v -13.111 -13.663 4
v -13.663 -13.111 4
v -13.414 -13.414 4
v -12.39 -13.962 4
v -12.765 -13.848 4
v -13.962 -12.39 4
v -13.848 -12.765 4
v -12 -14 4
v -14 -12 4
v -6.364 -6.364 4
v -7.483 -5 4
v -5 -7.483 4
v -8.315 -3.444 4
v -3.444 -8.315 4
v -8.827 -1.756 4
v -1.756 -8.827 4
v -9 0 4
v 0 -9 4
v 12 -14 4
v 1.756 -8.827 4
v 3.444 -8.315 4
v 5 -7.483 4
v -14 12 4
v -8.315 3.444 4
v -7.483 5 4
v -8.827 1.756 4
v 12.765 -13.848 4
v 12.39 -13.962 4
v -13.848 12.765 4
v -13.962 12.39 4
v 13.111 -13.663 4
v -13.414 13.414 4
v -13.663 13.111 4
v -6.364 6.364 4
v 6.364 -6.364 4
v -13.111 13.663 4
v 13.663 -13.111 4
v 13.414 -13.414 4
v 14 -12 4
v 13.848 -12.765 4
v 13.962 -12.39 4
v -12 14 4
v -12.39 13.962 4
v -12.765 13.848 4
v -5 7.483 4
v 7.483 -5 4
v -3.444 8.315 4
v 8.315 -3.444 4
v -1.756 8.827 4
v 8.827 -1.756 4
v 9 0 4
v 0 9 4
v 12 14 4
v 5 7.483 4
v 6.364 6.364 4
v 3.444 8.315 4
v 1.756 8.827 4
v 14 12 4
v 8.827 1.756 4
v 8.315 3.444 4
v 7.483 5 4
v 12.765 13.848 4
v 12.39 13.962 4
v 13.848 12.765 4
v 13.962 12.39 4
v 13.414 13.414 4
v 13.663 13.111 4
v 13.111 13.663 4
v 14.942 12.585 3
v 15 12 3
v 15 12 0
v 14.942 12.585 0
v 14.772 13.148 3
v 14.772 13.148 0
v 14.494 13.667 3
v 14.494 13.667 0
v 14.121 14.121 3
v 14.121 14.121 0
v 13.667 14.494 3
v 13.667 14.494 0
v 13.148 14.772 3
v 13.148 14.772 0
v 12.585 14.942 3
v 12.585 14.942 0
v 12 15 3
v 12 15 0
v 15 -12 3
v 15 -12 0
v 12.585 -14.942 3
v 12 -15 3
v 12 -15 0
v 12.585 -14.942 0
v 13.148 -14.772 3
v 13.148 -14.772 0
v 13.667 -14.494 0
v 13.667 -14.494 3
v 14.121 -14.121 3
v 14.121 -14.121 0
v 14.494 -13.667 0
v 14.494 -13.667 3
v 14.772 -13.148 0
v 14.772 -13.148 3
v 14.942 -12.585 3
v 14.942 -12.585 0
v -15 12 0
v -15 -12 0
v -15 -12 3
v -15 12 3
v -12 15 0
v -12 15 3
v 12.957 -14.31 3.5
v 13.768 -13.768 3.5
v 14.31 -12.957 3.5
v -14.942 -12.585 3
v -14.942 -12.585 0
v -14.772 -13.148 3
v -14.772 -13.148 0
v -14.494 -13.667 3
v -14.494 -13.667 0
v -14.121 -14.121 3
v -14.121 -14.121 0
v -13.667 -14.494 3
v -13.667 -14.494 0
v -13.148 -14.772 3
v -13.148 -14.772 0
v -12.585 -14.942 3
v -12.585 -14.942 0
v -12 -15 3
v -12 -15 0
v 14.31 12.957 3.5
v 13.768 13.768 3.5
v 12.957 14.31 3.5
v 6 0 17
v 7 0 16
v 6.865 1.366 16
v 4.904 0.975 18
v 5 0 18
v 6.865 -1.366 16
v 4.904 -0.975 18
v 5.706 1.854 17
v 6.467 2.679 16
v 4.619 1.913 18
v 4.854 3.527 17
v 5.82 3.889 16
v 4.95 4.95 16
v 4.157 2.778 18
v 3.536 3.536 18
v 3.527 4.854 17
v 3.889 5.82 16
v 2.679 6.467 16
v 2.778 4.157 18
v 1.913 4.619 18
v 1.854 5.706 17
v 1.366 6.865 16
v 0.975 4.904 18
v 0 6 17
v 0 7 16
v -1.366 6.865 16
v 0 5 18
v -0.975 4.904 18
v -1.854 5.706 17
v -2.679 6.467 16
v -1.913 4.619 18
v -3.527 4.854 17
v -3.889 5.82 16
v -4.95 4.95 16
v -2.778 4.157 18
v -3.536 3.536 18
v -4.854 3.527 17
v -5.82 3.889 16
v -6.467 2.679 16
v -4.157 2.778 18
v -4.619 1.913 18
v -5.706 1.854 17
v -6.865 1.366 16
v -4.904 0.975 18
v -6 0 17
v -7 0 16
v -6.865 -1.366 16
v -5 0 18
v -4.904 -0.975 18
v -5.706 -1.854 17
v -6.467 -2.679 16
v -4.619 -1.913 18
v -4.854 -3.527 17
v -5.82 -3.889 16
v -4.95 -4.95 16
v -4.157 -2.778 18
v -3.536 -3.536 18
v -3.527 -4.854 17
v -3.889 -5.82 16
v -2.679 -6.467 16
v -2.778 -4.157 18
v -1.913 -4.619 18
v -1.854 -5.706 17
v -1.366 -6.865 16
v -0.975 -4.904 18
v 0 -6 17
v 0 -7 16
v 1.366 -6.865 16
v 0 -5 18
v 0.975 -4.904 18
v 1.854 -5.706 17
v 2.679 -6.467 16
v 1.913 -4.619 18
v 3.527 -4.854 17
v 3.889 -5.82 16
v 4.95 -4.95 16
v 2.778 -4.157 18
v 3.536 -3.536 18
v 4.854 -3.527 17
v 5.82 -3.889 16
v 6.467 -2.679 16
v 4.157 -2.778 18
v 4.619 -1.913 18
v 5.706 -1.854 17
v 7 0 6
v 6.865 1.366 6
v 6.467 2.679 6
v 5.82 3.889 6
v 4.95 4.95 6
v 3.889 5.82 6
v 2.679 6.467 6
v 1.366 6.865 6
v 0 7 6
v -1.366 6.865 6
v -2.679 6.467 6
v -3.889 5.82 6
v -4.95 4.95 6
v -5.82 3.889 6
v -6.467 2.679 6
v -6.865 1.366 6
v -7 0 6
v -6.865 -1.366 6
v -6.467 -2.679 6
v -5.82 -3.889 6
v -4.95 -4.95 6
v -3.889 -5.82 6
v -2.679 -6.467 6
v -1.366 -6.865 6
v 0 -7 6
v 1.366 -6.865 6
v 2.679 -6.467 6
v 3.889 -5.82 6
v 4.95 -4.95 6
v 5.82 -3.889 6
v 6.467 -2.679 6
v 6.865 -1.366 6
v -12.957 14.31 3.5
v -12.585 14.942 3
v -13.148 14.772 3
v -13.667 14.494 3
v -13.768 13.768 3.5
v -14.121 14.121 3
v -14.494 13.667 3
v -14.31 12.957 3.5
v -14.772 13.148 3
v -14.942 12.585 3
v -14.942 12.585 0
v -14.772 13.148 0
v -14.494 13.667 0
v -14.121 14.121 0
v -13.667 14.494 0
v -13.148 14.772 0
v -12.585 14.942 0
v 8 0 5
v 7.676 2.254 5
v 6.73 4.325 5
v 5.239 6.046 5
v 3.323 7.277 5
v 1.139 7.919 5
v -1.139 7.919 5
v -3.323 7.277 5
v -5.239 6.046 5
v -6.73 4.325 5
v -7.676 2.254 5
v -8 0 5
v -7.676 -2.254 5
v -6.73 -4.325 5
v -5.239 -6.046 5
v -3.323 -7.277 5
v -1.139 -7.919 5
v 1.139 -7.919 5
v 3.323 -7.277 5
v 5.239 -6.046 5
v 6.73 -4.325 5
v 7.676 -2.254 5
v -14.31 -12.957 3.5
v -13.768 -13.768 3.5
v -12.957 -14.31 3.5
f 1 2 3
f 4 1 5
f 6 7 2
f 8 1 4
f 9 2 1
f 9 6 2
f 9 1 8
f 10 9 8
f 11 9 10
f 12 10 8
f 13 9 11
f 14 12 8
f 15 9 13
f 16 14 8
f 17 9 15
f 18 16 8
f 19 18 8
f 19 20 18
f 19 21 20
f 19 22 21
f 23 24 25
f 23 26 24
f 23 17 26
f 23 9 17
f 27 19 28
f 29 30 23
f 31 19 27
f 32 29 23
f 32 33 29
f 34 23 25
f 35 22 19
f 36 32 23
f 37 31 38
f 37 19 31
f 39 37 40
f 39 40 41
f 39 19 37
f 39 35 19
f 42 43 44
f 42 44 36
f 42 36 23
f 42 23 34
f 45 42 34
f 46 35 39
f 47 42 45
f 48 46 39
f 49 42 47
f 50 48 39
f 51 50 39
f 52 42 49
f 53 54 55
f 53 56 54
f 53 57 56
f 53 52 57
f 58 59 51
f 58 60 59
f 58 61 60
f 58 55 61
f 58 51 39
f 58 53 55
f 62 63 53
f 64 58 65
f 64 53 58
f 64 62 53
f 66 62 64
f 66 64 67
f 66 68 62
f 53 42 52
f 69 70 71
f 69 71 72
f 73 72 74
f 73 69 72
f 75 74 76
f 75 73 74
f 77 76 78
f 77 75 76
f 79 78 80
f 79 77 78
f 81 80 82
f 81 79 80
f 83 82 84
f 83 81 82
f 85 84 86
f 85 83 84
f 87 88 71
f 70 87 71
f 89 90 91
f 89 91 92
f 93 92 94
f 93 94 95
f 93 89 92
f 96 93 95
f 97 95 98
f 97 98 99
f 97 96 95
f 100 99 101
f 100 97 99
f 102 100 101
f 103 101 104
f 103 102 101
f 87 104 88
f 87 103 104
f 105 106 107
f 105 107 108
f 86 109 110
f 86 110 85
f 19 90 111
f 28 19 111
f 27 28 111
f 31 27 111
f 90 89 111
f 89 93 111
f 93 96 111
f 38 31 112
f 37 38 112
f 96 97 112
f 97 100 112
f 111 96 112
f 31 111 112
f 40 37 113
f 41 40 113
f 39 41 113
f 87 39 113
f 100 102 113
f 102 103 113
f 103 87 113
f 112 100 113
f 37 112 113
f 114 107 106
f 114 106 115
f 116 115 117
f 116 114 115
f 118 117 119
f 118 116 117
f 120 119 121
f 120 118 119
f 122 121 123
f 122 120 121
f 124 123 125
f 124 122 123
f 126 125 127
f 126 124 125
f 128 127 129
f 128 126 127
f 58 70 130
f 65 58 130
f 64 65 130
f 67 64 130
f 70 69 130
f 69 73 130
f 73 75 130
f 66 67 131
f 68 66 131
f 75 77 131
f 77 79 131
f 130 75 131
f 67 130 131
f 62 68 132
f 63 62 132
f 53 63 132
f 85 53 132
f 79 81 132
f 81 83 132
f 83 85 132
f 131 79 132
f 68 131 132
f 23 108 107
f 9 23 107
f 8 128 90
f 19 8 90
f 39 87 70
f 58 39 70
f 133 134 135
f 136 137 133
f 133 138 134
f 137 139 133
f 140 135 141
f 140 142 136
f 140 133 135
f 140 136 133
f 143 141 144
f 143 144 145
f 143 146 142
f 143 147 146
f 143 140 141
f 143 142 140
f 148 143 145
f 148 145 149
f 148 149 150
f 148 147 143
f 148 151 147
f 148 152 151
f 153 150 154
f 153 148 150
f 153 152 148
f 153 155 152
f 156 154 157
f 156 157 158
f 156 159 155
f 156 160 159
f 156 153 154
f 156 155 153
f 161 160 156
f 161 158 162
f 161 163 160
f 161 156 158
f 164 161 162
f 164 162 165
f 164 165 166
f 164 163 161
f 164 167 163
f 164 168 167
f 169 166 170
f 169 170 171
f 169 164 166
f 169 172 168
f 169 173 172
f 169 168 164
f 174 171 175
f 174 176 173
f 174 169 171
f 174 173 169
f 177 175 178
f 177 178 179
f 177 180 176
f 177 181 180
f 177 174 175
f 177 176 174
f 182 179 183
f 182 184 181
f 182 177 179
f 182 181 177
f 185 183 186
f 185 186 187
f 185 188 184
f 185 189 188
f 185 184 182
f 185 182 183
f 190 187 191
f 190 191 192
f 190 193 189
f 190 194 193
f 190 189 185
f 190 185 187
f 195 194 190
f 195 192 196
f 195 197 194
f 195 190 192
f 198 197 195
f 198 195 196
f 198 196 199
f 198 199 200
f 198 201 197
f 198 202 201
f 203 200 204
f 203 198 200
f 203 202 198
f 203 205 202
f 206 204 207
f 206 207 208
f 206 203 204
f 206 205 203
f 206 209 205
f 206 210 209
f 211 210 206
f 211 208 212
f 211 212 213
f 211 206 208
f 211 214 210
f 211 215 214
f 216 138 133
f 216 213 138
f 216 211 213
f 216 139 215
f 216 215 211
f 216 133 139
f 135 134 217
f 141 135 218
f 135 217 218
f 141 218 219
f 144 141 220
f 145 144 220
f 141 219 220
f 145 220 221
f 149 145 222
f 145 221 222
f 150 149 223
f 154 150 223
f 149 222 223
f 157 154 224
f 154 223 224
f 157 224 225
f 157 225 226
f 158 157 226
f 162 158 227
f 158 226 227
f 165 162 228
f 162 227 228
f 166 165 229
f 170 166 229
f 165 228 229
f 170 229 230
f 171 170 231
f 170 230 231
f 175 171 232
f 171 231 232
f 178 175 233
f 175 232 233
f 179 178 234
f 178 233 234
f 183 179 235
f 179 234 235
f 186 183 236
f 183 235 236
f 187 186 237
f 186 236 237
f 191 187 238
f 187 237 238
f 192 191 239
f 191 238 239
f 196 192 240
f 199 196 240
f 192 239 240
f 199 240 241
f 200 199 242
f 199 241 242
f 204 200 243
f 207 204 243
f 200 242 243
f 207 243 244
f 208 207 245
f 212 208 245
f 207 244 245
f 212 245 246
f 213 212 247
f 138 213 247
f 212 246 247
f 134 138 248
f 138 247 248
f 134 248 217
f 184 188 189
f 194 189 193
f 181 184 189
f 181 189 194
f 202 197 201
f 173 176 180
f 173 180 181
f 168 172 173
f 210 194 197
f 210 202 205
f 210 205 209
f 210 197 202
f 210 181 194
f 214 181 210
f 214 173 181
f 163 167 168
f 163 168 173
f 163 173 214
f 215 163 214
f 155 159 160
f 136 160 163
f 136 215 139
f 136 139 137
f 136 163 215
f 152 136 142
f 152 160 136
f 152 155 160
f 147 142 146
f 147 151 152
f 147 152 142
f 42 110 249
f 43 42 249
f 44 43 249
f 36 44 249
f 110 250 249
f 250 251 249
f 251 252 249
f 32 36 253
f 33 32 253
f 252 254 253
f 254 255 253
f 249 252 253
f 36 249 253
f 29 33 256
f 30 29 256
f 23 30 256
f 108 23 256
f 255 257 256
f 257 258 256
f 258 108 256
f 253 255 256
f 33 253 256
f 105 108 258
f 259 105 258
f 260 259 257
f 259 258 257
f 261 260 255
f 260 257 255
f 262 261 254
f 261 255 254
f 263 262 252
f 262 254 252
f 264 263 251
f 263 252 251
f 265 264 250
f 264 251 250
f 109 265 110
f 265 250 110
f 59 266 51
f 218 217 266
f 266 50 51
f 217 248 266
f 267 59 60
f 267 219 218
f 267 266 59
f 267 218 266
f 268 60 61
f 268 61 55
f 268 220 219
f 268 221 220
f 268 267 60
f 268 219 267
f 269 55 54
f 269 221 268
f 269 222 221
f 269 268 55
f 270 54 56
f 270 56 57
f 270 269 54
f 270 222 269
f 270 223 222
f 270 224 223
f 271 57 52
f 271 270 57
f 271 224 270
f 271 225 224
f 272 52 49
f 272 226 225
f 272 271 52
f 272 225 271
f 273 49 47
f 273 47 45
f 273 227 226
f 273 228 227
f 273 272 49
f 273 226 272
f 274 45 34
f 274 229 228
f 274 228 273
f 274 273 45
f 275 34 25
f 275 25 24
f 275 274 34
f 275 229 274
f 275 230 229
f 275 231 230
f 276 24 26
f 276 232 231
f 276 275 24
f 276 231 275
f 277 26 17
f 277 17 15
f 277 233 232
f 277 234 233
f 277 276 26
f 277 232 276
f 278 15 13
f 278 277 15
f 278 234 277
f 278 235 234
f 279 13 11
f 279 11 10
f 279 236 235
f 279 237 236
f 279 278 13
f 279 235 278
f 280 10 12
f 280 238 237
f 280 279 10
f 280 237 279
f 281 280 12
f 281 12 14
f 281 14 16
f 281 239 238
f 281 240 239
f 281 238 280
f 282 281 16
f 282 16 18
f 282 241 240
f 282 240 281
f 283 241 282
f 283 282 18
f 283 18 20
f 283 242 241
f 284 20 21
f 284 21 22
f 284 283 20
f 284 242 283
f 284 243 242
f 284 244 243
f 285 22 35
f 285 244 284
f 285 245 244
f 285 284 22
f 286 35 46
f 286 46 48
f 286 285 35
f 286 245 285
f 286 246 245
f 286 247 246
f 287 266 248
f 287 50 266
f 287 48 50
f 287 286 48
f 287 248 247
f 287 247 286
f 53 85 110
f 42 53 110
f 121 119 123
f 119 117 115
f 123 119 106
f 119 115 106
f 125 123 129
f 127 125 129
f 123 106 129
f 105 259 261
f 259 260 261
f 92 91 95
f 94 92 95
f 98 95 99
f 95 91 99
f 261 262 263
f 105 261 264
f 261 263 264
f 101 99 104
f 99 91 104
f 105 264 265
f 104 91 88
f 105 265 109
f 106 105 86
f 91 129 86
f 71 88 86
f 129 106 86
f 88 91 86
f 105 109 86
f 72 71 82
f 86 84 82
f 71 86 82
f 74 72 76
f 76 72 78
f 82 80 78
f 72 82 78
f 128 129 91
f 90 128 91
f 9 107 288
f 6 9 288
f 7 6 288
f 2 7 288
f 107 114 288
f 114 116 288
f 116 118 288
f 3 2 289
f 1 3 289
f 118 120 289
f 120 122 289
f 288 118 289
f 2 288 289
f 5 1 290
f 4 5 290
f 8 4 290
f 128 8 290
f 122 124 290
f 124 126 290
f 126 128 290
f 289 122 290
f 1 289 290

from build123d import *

# Parameters (mm, degrees)
F0_W     = 30
F0_H     = 30
F1_DEPTH = 4
F2_R     = 3
F3_R     = 7
F4_DEPTH = 14
F5_SIZE  = 2
F6_SIZE  = 1


with BuildPart() as f1:
    # F0 (on Top) → F1 (new body)
    with BuildSketch(Plane.XY):
        Rectangle(F0_W, F0_H)
    extrude(amount=F1_DEPTH)

    # F2
    f2_edges = [f1.edges().sort_by_distance(p)[0] for p in [
        (15, 15, 2),
        (-15, 15, 2),
        (-15, -15, 2),
        (15, -15, 2),
    ]]
    fillet(f2_edges, radius=F2_R)

    # F3 (on face) → F4 (join)
    with BuildSketch(Plane.XY.offset(4)):
        Circle(F3_R)
    extrude(amount=F4_DEPTH)

    # F5
    f5_edges = [f1.edges().sort_by_distance(p)[0] for p in [
        (-7, 0, 18),
        (-7, 0, 4),
    ]]
    chamfer(f5_edges, length=F5_SIZE)

    # F6
    f6_edges = [f1.edges().sort_by_distance(p)[0] for p in [
        (0, -15, 4),
    ]]
    chamfer(f6_edges, length=F6_SIZE)


solid = f1.part
